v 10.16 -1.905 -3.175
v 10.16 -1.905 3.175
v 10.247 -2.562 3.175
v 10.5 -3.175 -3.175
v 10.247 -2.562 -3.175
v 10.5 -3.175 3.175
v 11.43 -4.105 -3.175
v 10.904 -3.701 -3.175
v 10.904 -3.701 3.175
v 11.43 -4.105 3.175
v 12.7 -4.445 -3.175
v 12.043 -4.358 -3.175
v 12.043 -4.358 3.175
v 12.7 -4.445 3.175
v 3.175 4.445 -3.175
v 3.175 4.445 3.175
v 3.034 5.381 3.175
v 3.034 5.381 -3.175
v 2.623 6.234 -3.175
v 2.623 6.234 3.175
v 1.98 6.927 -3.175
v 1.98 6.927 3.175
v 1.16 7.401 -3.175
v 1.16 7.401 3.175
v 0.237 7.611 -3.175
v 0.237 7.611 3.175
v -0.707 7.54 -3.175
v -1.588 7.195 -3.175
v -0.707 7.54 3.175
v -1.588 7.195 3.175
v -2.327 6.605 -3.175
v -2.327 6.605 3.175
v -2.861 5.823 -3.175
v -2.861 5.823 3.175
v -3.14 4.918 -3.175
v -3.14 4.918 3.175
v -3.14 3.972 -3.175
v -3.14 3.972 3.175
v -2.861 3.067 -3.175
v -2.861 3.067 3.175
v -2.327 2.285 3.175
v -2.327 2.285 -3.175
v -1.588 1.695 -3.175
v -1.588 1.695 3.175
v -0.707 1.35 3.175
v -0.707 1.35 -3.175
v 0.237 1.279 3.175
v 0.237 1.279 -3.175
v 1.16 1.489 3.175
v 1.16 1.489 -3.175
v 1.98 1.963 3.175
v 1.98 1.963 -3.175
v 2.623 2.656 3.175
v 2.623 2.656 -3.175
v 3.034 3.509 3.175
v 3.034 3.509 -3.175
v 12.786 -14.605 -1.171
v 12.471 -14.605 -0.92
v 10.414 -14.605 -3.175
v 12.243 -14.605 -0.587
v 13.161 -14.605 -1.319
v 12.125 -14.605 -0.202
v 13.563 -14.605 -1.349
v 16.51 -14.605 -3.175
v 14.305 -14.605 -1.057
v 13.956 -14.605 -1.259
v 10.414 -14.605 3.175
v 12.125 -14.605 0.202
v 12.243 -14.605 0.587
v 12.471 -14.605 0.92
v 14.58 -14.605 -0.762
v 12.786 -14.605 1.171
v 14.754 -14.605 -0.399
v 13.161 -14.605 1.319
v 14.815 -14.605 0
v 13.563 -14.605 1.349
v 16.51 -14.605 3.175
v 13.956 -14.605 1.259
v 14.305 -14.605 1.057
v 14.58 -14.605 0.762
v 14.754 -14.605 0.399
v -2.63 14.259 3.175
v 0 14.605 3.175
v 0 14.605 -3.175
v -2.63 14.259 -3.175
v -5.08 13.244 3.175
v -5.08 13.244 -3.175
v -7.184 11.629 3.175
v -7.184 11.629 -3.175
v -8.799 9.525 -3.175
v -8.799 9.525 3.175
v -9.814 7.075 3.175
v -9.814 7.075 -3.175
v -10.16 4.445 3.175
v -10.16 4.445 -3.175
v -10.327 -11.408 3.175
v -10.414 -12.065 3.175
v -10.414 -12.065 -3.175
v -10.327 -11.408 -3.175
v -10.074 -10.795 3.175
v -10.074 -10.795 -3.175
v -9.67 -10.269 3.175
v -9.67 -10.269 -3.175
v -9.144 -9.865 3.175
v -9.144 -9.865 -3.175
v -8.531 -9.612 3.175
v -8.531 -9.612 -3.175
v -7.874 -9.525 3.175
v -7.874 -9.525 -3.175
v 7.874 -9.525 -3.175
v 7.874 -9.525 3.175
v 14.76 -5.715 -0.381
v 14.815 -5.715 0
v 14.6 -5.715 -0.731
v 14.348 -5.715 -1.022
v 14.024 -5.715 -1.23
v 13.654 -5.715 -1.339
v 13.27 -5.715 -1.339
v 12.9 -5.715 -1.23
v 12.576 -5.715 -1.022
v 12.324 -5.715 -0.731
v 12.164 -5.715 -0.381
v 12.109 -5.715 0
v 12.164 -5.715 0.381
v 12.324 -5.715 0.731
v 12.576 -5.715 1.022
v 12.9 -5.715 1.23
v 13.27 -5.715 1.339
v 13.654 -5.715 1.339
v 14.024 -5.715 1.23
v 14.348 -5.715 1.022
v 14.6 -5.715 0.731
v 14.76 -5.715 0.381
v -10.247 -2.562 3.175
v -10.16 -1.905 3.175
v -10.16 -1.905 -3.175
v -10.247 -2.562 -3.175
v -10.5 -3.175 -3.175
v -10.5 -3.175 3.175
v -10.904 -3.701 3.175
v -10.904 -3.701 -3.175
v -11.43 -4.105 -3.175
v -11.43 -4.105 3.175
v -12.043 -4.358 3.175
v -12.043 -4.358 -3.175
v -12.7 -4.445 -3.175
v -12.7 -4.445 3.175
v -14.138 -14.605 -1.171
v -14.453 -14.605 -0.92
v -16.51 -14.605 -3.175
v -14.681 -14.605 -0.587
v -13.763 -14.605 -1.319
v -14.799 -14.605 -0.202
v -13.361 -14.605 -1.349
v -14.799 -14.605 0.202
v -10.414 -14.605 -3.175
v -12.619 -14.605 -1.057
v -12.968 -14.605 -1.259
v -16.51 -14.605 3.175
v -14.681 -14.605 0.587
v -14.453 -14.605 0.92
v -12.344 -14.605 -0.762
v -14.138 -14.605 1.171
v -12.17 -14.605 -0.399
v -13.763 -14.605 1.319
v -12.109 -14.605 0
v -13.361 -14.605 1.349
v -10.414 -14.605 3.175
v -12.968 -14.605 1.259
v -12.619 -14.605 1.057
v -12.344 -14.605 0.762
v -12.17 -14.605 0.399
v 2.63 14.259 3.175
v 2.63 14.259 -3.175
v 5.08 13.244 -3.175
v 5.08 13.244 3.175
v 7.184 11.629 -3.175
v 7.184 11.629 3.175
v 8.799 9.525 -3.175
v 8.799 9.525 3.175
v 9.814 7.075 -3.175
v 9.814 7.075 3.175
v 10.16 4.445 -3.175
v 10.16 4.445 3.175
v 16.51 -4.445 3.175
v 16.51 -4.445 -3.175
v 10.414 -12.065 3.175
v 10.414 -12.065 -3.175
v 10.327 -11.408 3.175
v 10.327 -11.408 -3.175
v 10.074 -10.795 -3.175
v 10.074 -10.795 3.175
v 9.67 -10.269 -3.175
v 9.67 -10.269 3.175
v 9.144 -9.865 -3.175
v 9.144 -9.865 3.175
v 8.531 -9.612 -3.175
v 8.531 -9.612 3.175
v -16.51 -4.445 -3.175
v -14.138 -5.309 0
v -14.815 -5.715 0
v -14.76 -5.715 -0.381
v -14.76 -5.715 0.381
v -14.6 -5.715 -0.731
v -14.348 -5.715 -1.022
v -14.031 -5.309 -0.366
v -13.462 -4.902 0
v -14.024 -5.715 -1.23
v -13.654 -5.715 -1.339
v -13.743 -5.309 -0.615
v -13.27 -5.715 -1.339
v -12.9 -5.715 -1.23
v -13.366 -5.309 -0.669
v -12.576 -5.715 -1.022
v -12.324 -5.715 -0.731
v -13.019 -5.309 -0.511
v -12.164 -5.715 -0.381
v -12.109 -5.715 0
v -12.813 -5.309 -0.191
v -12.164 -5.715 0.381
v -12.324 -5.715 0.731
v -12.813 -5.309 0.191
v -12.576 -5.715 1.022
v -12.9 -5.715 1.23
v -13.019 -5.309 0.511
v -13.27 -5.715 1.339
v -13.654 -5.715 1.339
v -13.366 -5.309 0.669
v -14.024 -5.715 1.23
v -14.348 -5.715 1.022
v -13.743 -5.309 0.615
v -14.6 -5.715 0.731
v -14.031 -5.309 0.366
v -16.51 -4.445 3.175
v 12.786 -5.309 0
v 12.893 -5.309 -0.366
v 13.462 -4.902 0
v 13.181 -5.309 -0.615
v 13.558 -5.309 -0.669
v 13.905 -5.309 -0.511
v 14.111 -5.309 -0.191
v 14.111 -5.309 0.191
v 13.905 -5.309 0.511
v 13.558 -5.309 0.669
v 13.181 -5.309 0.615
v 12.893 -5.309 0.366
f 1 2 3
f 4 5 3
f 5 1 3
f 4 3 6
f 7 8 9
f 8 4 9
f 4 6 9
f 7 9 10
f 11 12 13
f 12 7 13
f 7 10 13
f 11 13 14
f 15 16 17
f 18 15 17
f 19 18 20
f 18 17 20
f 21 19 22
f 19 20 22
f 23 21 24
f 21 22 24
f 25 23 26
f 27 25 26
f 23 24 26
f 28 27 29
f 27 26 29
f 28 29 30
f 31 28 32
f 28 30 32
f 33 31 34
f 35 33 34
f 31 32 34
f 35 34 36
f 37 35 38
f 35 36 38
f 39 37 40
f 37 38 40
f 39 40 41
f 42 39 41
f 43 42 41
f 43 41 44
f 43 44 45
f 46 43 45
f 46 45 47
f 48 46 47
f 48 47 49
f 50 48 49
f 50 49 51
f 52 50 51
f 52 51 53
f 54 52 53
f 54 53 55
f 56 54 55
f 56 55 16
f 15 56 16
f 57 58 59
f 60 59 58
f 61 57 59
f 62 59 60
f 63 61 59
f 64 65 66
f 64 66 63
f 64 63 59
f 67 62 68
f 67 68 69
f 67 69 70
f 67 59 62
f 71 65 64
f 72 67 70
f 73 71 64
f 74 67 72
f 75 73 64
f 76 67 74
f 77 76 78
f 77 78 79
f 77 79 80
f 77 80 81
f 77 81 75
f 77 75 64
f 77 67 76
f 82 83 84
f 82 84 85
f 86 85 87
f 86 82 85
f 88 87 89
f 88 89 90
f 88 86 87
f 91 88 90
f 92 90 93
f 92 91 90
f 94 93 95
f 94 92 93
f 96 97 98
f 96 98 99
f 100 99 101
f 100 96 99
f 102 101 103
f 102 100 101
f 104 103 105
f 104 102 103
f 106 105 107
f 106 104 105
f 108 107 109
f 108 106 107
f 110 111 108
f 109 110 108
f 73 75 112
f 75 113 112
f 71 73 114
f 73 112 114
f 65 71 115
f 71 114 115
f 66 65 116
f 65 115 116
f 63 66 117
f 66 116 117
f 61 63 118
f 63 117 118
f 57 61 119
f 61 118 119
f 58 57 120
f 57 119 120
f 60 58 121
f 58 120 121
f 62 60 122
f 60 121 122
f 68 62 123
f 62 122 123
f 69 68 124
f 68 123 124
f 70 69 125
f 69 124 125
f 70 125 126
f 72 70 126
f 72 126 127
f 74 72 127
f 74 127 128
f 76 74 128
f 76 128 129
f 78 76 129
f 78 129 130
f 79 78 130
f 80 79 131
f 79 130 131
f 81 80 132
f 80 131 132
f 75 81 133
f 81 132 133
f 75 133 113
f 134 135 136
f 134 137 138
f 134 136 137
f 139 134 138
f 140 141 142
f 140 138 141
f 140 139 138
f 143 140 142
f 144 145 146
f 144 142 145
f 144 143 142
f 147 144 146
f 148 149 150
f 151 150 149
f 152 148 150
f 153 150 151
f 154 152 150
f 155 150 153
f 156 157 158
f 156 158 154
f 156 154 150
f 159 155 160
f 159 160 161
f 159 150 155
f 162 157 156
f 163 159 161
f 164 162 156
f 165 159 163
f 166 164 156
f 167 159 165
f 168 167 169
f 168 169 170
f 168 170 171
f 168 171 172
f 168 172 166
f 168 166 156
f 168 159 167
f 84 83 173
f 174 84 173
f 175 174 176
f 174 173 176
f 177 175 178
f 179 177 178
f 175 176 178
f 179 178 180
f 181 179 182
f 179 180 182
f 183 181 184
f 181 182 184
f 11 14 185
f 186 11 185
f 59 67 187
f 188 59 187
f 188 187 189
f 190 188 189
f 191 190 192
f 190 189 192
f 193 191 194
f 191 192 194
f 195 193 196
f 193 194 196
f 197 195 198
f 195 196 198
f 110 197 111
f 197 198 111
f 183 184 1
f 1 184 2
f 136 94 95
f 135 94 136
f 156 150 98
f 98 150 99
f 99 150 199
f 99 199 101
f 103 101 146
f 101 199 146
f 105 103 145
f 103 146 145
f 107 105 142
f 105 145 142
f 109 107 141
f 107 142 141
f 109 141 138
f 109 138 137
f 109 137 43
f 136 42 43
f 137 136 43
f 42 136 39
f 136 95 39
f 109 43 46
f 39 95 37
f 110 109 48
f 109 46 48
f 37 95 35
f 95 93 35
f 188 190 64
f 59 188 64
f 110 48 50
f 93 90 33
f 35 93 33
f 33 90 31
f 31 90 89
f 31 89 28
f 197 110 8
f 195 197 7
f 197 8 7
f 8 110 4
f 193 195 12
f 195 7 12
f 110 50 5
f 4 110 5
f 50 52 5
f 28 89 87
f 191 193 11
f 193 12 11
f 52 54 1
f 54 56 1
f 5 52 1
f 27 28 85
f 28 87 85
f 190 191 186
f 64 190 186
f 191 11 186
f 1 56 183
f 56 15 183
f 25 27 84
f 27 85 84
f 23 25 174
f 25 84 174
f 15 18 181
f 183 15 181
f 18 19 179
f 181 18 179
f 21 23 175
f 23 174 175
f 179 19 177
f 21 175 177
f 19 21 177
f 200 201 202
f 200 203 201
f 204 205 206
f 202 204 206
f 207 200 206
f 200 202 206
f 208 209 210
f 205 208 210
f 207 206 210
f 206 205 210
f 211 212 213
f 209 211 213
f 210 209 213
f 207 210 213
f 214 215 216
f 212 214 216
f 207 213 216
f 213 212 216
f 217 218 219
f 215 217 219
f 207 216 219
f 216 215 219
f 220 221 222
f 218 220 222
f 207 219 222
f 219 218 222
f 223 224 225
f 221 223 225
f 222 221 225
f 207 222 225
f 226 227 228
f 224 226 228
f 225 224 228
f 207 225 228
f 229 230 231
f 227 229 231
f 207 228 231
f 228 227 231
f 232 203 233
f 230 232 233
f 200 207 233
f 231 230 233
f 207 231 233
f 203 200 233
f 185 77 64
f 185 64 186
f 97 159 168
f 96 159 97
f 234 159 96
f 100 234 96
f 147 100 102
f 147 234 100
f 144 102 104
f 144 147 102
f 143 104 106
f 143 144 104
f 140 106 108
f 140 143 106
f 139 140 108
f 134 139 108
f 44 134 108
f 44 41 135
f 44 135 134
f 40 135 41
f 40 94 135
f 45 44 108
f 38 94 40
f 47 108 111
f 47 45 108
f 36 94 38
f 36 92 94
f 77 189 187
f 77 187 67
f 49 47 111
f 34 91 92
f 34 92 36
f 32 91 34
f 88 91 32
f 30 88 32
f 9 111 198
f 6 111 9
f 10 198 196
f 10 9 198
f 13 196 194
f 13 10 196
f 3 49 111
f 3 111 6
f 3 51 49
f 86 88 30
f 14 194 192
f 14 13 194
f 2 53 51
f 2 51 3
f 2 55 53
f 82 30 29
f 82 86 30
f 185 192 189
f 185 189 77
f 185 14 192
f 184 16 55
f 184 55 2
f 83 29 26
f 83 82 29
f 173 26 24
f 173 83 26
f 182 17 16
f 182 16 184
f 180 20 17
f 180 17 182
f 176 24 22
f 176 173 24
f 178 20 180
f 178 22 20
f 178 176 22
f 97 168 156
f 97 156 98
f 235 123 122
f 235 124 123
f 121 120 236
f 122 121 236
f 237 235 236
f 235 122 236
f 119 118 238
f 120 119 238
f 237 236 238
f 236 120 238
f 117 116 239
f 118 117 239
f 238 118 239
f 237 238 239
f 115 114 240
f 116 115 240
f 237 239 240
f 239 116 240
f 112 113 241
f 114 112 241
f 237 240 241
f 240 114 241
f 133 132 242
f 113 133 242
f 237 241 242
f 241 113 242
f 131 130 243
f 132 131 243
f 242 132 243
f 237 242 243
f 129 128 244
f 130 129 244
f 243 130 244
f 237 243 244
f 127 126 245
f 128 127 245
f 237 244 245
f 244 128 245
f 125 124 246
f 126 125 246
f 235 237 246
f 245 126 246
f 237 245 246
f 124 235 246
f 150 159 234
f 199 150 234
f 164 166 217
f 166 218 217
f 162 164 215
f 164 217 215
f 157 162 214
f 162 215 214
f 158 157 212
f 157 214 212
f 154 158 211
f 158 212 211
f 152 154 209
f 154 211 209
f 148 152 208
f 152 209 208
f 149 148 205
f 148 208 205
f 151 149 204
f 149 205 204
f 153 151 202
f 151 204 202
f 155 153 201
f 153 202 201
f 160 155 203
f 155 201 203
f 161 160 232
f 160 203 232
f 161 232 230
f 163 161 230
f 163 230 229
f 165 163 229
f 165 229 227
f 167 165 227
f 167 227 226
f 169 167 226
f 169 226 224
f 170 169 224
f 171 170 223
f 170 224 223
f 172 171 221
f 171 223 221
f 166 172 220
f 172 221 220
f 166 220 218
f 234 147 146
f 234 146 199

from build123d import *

# Parameters (mm, degrees)
SKETCH1_W                 = 33.02
SKETCH1_H                 = 29.21
BOSS_EXTRUDE1_DEPTH       = 3.175
CUT_EXTRUDE1_REACH        = 24.939
CUT_EXTRUDE2_REACH        = 24.939
SKETCH3_R                 = 3.175
F_6_32_TAPPED_HOLE1_D     = 2.7051
F_6_32_TAPPED_HOLE1_DEPTH = 8.89
F_6_32_TAPPED_HOLE1_TIP   = 0.81269403


with BuildPart() as part:
    # Sketch1 → Boss-Extrude1 (new, symmetric)
    with BuildSketch(Plane.XY):
        Rectangle(SKETCH1_W, SKETCH1_H)
    extrude(amount=BOSS_EXTRUDE1_DEPTH, both=True)

    # Sketch2 → Cut-Extrude1 (cut, up to next)
    with BuildSketch(Plane.XY.offset(3.175), mode=Mode.PRIVATE) as cut_extrude1_sk1:
        with BuildLine():
            Line((-10.16, 4.445), (-10.16, -1.905))
            ThreePointArc((-10.16, -1.905), (-10.903948776, -3.701051224), (-12.7, -4.445))
            Line((-12.7, -4.445), (-16.51, -4.445))
            Line((-16.51, -4.445), (-16.51, 14.605))
            Line((-16.51, 14.605), (0, 14.605))
            ThreePointArc((0, 14.605), (-7.184204897, 11.629204897), (-10.16, 4.445))
        make_face()
    cut_extrude1_tool1 = extrude(cut_extrude1_sk1.sketch, amount=-CUT_EXTRUDE1_REACH, mode=Mode.PRIVATE) & part.part
    # Sketch2 → Cut-Extrude1 (cut, up to next)
    with BuildSketch(Plane.XY.offset(3.175), mode=Mode.PRIVATE) as cut_extrude1_sk2:
        with BuildLine():
            Line((-7.874, -9.525), (0, -9.525))
            Line((0, -9.525), (0, -14.605))
            Line((0, -14.605), (-10.414, -14.605))
            Line((-10.414, -14.605), (-10.414, -12.065))
            ThreePointArc((-10.414, -12.065), (-9.670051224, -10.268948776), (-7.874, -9.525))
        make_face()
    cut_extrude1_tool2 = extrude(cut_extrude1_sk2.sketch, amount=-CUT_EXTRUDE1_REACH, mode=Mode.PRIVATE) & part.part
    cut_extrude1_1 = cut_extrude1_tool1.solids().sort_by_distance((-12.509542, 6.301506, 3.175))[0]
    add(cut_extrude1_1, mode=Mode.SUBTRACT)
    cut_extrude1_2 = cut_extrude1_tool2.solids().sort_by_distance((-5.082313, -12.118013, 3.175))[0]
    add(cut_extrude1_2, mode=Mode.SUBTRACT)
    cut_extrude1 = cut_extrude1_1 + cut_extrude1_2  # Cut-Extrude1 as one shape, for the pattern or mirror that repeats it

    # Mirror1: Cut-Extrude1 across plane
    add(cut_extrude1.mirror(Plane(origin=(0, 0, 0), x_dir=(0, 0, 1), z_dir=(1, 0, 0))), mode=Mode.SUBTRACT)

    # Sketch3 → Cut-Extrude2 (cut, up to next)
    with BuildSketch(Plane.XY.offset(3.175), mode=Mode.PRIVATE) as cut_extrude2_sk1:
        with Locations((0, 4.445)):
            Circle(SKETCH3_R)
    cut_extrude2_tool1 = extrude(cut_extrude2_sk1.sketch, amount=-CUT_EXTRUDE2_REACH, mode=Mode.PRIVATE) & part.part
    add(cut_extrude2_tool1.solids().sort_by_distance((0, 4.445, 3.175))[0], mode=Mode.SUBTRACT)

    # #6-32 Tapped Hole1
    with Locations(Plane(origin=(0, -14.605, 0), x_dir=(-1, 0, 0), z_dir=(0, -1, 0))):
        with Locations((-13.462, 0), (13.462, 0)):
            Hole(F_6_32_TAPPED_HOLE1_D / 2, depth=F_6_32_TAPPED_HOLE1_DEPTH)
            with Locations((0, 0, -(F_6_32_TAPPED_HOLE1_DEPTH + F_6_32_TAPPED_HOLE1_TIP / 2))):  # 118° drill point
                Cone(0, F_6_32_TAPPED_HOLE1_D / 2, F_6_32_TAPPED_HOLE1_TIP, mode=Mode.SUBTRACT)


solid = part.part
